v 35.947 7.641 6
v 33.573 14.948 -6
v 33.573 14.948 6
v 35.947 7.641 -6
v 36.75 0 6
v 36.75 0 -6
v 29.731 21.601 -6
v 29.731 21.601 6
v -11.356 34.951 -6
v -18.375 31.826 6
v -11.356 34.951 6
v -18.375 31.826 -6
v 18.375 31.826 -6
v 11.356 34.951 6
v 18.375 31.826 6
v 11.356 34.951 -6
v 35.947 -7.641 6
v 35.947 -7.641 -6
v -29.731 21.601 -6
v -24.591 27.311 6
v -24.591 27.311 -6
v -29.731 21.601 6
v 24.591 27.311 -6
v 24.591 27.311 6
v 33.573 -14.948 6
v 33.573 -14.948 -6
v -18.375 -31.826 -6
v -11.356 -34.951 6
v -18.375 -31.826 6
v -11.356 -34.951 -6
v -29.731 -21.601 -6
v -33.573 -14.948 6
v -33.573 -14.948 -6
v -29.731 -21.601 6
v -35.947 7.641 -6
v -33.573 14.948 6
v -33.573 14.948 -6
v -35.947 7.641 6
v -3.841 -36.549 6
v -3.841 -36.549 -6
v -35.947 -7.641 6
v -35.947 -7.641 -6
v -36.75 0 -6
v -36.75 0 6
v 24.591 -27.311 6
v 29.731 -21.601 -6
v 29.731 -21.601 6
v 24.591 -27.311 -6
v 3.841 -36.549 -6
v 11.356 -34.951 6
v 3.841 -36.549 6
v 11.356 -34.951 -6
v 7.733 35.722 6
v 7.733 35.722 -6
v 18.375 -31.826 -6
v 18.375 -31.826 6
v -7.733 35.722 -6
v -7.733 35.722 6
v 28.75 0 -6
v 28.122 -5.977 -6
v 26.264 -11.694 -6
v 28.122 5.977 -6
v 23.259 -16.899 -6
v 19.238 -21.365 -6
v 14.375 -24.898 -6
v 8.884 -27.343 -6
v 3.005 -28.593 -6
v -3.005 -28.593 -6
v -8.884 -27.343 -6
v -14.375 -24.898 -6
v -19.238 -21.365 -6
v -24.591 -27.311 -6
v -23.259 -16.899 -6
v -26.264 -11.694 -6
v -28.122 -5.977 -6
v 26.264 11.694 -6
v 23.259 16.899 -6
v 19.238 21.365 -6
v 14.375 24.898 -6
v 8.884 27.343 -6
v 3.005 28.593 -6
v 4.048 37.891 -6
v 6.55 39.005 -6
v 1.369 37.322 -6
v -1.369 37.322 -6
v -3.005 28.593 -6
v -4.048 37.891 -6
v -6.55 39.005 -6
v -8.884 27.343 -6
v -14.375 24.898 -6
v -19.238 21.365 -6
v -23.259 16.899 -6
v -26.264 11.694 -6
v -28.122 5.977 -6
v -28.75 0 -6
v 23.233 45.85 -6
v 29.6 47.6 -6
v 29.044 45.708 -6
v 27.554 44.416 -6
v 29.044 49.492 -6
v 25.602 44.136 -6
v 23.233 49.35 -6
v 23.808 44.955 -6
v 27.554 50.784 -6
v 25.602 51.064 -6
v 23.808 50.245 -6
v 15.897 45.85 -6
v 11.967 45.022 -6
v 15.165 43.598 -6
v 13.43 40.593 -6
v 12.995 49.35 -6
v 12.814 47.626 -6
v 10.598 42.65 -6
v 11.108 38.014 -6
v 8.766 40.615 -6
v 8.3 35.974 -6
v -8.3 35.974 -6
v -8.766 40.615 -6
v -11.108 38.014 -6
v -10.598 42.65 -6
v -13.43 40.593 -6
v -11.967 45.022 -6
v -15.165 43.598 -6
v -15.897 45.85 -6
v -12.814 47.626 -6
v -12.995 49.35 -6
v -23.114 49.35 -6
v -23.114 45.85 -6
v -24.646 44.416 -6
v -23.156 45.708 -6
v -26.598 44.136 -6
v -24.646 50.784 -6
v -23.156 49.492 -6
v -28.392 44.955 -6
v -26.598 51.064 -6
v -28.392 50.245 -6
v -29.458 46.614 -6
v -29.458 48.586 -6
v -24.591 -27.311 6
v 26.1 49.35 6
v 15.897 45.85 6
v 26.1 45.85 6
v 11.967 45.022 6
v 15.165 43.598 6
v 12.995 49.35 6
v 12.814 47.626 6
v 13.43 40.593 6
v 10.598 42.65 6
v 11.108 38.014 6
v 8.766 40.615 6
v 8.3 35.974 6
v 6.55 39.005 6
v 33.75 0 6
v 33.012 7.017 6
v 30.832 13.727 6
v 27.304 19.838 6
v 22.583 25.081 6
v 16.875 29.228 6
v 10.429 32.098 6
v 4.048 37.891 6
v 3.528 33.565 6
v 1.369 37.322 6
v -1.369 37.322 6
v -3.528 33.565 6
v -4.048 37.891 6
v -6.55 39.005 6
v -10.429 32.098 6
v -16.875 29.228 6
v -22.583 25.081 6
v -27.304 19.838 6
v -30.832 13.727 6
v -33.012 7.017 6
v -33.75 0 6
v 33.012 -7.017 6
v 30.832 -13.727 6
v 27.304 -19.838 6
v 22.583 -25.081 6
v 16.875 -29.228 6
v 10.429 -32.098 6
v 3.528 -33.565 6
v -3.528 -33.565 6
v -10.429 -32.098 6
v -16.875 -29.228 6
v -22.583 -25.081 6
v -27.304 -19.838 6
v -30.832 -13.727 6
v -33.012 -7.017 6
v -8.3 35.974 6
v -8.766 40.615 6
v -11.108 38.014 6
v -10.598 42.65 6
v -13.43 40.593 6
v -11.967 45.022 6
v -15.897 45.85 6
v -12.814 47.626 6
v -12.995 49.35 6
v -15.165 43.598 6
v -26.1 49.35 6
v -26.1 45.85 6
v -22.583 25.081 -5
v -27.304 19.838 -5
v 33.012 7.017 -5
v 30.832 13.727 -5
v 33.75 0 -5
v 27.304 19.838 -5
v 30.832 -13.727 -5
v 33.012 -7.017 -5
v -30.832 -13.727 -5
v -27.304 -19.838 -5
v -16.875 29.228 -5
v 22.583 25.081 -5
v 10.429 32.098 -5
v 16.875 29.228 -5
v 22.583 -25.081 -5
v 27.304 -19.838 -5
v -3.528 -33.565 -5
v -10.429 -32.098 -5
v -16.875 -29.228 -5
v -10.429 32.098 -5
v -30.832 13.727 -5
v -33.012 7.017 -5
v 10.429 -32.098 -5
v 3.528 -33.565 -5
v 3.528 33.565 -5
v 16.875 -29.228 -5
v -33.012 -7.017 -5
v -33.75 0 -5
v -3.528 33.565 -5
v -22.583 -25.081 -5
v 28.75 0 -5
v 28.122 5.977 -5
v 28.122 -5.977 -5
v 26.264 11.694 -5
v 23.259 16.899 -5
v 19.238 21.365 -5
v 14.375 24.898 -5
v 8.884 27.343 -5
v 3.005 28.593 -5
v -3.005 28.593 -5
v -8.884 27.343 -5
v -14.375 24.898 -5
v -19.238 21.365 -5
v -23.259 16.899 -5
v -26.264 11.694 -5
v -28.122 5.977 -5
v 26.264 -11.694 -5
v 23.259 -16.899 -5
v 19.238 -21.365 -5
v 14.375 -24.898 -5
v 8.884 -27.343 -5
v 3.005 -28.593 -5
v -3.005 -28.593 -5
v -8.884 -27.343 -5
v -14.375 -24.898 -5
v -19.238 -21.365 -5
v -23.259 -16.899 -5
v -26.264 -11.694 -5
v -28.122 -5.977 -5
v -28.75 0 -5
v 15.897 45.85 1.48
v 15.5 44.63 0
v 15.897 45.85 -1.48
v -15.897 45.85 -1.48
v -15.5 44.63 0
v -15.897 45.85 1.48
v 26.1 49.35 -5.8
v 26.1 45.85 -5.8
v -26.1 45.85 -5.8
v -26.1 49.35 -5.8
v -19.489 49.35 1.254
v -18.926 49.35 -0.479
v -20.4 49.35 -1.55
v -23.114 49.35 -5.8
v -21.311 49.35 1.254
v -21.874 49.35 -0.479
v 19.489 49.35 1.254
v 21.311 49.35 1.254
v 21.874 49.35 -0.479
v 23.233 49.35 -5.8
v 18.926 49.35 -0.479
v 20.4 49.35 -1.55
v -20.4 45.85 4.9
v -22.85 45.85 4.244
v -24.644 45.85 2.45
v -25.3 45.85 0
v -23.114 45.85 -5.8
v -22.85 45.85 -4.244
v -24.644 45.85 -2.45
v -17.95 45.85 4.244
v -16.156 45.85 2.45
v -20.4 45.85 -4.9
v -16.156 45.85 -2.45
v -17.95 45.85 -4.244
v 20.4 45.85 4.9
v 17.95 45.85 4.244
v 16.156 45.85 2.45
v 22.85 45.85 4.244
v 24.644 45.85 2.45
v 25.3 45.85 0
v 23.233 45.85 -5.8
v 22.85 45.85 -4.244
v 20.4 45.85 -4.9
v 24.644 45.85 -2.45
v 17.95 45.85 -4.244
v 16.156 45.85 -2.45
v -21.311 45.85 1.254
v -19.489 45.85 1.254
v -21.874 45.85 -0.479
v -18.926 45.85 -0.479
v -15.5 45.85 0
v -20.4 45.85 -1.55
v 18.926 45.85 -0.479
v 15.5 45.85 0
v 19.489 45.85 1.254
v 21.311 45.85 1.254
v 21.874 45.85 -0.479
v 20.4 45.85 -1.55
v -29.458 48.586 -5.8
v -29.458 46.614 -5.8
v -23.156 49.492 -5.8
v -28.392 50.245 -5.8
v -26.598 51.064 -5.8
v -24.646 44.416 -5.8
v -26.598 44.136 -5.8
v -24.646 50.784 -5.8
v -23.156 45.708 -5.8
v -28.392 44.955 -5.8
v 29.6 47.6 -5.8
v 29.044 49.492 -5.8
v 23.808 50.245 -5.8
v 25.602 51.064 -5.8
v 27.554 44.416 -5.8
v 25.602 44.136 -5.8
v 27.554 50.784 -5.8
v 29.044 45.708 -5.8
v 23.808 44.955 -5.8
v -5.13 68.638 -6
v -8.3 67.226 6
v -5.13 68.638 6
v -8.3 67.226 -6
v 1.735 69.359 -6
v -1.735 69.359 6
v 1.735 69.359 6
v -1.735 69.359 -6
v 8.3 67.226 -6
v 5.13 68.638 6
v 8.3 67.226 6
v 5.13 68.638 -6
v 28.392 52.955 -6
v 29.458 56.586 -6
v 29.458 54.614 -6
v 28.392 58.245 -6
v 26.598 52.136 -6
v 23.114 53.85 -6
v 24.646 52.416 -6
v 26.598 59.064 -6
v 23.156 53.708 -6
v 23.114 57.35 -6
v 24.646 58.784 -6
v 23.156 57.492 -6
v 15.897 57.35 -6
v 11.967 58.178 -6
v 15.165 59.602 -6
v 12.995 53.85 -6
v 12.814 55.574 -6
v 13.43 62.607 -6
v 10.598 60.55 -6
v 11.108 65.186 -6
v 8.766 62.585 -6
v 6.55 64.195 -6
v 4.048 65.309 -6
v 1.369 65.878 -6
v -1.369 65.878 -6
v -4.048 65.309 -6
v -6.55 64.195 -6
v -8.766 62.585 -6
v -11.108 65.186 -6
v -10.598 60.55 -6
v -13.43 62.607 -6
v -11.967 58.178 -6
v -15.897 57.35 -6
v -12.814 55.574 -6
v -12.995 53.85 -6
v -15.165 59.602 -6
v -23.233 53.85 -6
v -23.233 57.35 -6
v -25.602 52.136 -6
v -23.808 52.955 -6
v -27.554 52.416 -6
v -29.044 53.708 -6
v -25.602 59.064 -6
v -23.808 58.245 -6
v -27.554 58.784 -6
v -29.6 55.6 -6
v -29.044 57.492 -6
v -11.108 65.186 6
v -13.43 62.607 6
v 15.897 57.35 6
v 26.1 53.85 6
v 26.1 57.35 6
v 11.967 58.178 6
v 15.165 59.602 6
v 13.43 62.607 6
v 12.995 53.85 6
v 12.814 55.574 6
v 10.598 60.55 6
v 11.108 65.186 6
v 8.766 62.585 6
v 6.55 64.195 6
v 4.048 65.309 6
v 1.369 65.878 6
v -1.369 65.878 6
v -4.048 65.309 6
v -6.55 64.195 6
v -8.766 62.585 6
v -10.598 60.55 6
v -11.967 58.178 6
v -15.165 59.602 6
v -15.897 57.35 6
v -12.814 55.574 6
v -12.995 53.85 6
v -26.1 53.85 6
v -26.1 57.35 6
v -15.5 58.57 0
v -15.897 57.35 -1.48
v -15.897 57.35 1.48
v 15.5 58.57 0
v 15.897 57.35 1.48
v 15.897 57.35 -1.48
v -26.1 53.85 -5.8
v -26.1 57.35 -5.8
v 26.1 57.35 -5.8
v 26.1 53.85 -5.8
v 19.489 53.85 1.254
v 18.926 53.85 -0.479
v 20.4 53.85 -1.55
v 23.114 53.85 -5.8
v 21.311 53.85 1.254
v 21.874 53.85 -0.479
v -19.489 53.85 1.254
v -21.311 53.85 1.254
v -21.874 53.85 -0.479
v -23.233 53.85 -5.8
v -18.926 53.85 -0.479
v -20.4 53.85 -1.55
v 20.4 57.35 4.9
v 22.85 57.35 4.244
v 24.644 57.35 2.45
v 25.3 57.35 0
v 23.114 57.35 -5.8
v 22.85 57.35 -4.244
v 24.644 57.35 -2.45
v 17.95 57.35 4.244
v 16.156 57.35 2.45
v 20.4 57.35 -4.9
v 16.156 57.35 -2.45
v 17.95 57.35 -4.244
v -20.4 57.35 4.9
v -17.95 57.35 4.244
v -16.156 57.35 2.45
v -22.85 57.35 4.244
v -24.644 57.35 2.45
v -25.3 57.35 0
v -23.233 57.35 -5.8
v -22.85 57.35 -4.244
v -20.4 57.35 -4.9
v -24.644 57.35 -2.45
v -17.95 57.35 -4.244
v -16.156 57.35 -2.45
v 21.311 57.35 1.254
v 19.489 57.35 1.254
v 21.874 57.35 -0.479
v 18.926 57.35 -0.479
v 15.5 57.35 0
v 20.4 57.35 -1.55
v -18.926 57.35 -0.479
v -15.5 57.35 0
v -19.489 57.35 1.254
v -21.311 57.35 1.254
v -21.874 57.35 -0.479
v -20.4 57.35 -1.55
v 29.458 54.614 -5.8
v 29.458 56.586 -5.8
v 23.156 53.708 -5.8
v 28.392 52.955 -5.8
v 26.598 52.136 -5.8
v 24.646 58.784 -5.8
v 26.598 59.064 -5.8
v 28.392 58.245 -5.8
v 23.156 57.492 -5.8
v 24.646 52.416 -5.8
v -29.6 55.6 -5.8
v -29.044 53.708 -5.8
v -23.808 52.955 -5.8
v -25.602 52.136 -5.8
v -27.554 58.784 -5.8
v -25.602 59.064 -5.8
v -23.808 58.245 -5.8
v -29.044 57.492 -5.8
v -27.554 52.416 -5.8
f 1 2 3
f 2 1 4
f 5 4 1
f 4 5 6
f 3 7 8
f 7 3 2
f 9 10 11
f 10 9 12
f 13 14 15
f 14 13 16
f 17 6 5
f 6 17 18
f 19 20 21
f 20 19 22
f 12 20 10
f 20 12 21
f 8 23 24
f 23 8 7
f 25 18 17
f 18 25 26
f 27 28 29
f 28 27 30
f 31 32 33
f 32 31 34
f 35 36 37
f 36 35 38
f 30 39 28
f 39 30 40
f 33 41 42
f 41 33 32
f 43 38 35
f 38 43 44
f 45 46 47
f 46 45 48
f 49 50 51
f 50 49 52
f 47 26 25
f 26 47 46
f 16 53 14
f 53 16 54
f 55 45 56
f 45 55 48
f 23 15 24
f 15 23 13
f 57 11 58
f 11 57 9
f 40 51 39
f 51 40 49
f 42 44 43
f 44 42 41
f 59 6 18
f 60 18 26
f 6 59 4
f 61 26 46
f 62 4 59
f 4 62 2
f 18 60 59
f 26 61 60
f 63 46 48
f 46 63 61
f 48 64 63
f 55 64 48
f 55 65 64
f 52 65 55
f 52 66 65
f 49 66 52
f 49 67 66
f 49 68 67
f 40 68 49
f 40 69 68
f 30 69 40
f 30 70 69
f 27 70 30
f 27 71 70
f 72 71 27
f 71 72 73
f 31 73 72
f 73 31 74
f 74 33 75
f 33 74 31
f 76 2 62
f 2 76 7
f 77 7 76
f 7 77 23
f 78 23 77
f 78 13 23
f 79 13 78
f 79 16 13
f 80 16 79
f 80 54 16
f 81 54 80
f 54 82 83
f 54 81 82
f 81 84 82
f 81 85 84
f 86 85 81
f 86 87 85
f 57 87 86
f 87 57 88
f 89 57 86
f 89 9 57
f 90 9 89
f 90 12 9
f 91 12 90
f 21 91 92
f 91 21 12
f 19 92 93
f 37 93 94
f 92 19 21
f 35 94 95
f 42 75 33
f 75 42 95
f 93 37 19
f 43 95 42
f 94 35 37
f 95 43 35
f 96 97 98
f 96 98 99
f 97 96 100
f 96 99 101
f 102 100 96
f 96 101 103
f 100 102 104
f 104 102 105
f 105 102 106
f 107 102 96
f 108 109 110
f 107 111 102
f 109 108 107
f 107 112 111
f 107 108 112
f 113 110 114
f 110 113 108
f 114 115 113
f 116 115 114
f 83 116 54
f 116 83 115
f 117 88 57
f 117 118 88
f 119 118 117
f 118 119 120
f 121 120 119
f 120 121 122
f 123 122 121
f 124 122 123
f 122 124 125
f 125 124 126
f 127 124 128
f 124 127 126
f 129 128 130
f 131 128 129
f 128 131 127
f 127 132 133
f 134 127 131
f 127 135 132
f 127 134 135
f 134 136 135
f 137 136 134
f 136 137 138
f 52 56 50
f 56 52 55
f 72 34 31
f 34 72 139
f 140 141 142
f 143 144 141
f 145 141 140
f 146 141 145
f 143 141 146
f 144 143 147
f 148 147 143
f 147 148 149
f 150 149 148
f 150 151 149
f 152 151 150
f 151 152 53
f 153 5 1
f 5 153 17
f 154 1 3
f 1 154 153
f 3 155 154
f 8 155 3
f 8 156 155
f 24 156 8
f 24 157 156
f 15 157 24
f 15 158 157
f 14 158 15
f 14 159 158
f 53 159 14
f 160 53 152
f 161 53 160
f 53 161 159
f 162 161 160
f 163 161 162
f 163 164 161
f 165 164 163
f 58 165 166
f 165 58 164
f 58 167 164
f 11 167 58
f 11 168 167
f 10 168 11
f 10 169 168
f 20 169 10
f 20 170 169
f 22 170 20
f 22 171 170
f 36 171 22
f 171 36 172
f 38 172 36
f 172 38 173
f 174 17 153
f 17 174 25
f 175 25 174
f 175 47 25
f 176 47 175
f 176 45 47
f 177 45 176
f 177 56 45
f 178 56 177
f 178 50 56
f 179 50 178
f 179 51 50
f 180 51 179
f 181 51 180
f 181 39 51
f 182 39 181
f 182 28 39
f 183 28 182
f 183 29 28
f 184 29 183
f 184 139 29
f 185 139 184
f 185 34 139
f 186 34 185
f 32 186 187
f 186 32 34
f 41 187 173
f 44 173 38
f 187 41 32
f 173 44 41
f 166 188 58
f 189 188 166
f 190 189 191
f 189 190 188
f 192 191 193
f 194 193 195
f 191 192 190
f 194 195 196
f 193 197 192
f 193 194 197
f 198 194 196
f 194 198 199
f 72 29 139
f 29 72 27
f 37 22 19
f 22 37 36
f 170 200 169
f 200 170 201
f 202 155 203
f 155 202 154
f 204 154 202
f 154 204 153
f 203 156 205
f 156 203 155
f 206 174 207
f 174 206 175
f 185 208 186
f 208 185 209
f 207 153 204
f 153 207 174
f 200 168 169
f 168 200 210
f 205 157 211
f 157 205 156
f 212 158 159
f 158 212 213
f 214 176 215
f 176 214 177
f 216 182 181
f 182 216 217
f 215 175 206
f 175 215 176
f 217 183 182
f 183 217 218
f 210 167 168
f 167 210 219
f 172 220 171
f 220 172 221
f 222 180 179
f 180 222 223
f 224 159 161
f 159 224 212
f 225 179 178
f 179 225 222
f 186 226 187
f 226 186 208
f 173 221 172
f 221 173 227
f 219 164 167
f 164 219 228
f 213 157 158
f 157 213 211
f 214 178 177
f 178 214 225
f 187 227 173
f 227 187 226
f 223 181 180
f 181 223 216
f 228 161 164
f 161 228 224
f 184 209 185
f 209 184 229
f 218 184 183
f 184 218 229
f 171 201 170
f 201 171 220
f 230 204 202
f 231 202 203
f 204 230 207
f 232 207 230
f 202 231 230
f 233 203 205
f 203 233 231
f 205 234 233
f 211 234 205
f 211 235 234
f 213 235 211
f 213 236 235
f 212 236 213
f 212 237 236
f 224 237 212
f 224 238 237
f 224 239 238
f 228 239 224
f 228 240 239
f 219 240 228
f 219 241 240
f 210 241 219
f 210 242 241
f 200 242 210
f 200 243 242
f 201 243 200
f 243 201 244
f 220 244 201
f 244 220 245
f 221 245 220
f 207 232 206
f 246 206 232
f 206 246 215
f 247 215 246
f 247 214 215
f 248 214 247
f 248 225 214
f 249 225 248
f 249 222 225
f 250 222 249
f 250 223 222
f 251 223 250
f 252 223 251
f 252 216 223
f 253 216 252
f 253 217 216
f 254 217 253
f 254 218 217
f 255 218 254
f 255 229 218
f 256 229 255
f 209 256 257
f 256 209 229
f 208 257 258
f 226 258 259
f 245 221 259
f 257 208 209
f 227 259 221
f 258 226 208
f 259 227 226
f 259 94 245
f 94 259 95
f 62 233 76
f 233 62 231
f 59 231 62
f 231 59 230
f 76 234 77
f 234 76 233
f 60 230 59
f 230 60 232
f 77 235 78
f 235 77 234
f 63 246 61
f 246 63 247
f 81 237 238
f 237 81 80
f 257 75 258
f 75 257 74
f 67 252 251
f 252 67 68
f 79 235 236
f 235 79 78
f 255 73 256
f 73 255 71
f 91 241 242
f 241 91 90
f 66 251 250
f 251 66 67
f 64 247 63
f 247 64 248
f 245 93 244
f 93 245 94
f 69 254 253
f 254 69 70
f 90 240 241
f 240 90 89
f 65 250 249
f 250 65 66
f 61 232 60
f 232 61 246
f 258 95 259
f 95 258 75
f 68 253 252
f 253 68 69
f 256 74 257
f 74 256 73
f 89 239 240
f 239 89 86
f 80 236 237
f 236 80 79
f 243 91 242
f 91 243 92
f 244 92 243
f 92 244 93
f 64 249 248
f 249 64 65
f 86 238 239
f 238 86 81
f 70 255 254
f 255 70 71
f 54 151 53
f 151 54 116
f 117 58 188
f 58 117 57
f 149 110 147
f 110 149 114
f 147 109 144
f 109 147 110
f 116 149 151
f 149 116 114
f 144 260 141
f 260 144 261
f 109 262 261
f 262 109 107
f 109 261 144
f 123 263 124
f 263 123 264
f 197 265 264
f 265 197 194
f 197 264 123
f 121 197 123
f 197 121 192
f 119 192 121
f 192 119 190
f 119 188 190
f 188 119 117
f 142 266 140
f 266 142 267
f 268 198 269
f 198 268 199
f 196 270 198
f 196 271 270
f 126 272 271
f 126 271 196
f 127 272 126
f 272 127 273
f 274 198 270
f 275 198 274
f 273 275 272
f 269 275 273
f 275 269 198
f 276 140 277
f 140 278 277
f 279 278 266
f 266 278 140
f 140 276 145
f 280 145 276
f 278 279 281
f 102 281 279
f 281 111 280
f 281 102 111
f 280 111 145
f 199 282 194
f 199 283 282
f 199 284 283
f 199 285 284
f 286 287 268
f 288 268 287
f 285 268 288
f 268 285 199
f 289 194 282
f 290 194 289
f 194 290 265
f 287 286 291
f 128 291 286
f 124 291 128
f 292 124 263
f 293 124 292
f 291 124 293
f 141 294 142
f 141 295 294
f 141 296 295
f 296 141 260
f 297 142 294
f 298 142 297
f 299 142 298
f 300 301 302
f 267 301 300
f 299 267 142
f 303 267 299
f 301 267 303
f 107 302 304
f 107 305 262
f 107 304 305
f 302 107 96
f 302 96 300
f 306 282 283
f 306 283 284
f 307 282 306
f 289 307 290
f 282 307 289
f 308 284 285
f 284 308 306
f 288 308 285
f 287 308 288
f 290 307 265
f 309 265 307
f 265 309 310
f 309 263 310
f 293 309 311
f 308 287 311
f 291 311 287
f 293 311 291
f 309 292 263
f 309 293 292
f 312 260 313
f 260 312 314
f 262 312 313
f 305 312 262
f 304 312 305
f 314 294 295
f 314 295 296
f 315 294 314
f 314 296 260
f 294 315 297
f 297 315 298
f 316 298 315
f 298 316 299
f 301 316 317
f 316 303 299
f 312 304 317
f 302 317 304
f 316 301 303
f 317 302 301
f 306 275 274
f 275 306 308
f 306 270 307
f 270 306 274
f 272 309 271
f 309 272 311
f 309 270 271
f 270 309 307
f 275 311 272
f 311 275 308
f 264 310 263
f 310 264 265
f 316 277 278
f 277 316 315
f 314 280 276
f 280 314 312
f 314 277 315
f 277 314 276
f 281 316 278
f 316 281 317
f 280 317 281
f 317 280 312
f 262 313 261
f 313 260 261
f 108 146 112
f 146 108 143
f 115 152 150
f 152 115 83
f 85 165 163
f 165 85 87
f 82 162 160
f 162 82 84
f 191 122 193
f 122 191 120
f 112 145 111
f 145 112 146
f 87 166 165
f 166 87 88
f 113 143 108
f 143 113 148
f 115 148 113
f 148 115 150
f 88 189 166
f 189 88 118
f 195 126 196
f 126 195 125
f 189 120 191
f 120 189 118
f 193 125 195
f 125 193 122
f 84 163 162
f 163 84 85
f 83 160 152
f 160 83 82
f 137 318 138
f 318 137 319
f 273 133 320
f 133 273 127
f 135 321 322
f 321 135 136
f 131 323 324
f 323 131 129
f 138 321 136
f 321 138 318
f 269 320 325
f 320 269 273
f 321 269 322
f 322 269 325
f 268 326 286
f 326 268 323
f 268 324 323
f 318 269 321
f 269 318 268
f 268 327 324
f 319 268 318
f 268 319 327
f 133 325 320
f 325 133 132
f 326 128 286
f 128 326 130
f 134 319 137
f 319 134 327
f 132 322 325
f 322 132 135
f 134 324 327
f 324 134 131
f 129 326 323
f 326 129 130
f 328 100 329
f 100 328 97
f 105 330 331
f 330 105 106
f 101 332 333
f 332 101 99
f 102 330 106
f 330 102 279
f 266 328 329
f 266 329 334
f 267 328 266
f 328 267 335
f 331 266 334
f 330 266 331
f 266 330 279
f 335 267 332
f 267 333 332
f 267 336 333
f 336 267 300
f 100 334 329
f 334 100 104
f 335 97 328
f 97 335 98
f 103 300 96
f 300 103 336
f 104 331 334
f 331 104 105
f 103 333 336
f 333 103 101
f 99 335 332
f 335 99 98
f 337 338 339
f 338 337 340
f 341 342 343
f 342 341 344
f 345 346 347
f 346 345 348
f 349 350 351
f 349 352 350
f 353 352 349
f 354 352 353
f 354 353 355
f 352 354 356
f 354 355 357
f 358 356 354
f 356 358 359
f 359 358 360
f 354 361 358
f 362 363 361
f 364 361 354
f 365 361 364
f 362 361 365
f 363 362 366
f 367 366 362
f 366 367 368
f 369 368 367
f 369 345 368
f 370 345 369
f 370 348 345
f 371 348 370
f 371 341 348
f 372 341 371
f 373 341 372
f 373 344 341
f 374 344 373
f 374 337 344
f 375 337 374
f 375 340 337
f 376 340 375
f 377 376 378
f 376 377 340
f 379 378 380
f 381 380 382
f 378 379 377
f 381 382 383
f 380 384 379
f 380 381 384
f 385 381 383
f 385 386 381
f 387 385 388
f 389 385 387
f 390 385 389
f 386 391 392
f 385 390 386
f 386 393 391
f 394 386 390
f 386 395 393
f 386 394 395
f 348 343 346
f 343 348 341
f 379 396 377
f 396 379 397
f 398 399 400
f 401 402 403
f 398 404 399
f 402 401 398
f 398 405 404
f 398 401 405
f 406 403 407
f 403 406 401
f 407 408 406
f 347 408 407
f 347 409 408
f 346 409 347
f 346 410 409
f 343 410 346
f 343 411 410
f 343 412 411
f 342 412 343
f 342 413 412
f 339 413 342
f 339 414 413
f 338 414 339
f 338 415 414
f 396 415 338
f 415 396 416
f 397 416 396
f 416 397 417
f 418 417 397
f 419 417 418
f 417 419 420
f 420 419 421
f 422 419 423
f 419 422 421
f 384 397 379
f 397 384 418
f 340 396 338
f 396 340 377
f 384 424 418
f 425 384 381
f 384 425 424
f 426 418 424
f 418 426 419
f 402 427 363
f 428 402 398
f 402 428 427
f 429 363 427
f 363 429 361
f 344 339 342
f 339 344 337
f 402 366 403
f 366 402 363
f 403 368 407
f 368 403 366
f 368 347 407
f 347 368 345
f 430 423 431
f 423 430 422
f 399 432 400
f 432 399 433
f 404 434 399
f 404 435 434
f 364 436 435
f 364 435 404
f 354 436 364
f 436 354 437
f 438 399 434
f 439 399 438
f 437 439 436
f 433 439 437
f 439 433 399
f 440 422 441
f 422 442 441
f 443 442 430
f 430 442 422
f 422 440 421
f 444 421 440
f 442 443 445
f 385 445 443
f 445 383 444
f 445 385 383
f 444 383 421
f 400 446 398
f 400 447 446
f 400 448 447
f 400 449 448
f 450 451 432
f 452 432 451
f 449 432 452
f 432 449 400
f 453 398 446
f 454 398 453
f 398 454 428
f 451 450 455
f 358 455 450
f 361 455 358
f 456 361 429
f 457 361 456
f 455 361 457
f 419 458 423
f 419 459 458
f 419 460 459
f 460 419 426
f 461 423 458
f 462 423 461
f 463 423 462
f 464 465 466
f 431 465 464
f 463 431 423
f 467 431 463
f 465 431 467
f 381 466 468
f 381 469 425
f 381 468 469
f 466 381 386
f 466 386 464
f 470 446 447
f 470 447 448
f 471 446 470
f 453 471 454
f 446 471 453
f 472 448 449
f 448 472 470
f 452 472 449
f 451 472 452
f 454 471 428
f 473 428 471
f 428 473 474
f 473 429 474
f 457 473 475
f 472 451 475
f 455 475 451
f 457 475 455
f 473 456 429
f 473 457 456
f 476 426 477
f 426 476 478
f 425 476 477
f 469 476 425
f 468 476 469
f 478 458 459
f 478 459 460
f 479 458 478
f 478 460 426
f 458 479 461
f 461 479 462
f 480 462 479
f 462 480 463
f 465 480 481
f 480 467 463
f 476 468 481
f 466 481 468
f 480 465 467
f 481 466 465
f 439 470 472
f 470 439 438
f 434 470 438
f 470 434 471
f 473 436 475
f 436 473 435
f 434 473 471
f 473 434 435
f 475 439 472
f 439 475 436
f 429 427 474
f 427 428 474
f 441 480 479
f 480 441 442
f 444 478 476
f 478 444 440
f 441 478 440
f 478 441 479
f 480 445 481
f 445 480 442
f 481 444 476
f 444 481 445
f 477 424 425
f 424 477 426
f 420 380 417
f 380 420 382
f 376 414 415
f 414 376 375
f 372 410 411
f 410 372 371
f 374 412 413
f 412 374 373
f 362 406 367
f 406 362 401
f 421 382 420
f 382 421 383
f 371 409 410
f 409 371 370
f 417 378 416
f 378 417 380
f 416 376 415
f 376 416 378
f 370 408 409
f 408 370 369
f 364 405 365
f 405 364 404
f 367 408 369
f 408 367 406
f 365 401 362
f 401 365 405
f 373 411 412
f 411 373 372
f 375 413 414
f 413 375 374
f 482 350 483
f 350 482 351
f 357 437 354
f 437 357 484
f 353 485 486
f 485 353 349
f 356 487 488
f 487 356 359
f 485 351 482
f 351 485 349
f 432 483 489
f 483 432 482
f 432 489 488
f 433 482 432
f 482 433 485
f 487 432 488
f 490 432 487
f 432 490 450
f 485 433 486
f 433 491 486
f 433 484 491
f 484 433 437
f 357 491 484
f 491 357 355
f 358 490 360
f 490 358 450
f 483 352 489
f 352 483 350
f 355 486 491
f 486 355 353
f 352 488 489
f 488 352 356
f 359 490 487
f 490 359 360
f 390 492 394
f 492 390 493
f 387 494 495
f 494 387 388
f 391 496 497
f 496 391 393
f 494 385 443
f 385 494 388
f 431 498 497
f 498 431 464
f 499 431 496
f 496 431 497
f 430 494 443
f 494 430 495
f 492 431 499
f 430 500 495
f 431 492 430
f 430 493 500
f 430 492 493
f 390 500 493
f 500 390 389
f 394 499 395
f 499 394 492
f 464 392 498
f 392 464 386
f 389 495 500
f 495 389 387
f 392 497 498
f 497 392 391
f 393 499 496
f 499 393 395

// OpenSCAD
/* [Bottle] */

// diameter of bottle to be held (plus any extra spacing)
bottle_diam = 67.5;

// height of bottle holder
holder_height = 12;

// thickness of bottle holder
holder_thick = 3;

// thickness of holder bottom (0 for none)
holder_bottom_thick = 1;

// width of holder bottom lip (0 for none)
holder_bottom_lip = 5;


/* [Mount] */

// diameter of pole to be mounted to
mount_diam = 26.2;

// height of mount
mount_height = holder_height;

// thickness of mount
mount_thick = 3.5;

// width of wing for bolt
bracket_width = 13;

// thickness of wing
bracket_thick = 3.5;

// cut offset of wing to improve pole grip
bracket_offset = 1;

// offset from wing edge for bolt center
bolt_offset = 5.7;

// diameter of bolt
bolt_diam = 3.1;

// diameter of bolt washer
washer_diam = 9.8;


/* [Helpers] */

// generate build-platform corner helpers?
generate_holddown = 1; // [0:no, 1:yes]


////////////////////////////////////////////////////////////////////////

bottle_rad = bottle_diam/2;
mount_rad = mount_diam/2;
bolt_rad = bolt_diam/2;
washer_rad = washer_diam/2;

////////////////////////////////////////////////////////////////////////

holder();

translate([0, bottle_rad+max(holder_thick,mount_thick)+mount_rad, 0])
{
    mount();

    translate([0, mount_thick-bracket_offset, 0])
    rotate([0, 0, 180])
    mount();
}

////////////////////////////////////////////////////////////////////////

module holder()
{
    // base shape
    difference()
    {
        // outer ring
        cylinder(r=bottle_rad+holder_thick, h=holder_height, center=true);

        // cut out bottle
        cylinder(r=bottle_rad, h=holder_height+0.1, center=true);
    }

    // something to rest the bottle against?
    if(holder_bottom_thick > 0 && holder_bottom_lip > 0)
    {
        translate([0, 0, (holder_bottom_thick-holder_height)/2])
        difference()
        {
            cylinder(r=bottle_rad+0.1, h=holder_bottom_thick, center=true);

            cylinder(r=bottle_rad-holder_bottom_lip, h=holder_bottom_thick+0.1, center=true);
        }
    }
}

module mount()
{
    wing_off = mount_rad+bracket_width;
    holddown = 0.2;

    difference()
    {
        // base shape
        union()
        {
            // outer ring
            cylinder(r=mount_rad+mount_thick, h=mount_height, center=true);

            // wing
            translate([0, -bracket_thick/2-bracket_offset, 0])
            cube([mount_diam+bracket_width*2, bracket_thick, mount_height], center=true);
        }

        // cut out the pole
        cylinder(r=mount_rad, h=mount_height+0.1, center=true);

        // crop the wing/ring to inset that we selected
        translate([0, mount_diam-bracket_offset, 0])
        cube(mount_diam*2, center=true);

        // cut out two bolt holes
        for(i=[-1, 1])
        translate([i*(wing_off-bolt_offset), -bracket_thick/2-bracket_offset, 0])
        {
            // bolt itself
            rotate([90, 90, 0])
            cylinder(r=bolt_rad, h=bracket_thick*2, center=true);

            // cut into wall to fit washer
            translate([0, -bracket_thick, 0])
            rotate([90, 90, 0])
            cylinder(r=washer_rad, h=bracket_thick, center=true, $fn=12);
        }
    }

    // build platform helper?
    if(generate_holddown)
    {
        for(i=[-1, 1])
        translate([i*(wing_off), -bracket_thick/2-bracket_offset, -mount_height/2+holddown/2])
        cylinder(r=bracket_thick, h=holddown, center=true);
    }
}
